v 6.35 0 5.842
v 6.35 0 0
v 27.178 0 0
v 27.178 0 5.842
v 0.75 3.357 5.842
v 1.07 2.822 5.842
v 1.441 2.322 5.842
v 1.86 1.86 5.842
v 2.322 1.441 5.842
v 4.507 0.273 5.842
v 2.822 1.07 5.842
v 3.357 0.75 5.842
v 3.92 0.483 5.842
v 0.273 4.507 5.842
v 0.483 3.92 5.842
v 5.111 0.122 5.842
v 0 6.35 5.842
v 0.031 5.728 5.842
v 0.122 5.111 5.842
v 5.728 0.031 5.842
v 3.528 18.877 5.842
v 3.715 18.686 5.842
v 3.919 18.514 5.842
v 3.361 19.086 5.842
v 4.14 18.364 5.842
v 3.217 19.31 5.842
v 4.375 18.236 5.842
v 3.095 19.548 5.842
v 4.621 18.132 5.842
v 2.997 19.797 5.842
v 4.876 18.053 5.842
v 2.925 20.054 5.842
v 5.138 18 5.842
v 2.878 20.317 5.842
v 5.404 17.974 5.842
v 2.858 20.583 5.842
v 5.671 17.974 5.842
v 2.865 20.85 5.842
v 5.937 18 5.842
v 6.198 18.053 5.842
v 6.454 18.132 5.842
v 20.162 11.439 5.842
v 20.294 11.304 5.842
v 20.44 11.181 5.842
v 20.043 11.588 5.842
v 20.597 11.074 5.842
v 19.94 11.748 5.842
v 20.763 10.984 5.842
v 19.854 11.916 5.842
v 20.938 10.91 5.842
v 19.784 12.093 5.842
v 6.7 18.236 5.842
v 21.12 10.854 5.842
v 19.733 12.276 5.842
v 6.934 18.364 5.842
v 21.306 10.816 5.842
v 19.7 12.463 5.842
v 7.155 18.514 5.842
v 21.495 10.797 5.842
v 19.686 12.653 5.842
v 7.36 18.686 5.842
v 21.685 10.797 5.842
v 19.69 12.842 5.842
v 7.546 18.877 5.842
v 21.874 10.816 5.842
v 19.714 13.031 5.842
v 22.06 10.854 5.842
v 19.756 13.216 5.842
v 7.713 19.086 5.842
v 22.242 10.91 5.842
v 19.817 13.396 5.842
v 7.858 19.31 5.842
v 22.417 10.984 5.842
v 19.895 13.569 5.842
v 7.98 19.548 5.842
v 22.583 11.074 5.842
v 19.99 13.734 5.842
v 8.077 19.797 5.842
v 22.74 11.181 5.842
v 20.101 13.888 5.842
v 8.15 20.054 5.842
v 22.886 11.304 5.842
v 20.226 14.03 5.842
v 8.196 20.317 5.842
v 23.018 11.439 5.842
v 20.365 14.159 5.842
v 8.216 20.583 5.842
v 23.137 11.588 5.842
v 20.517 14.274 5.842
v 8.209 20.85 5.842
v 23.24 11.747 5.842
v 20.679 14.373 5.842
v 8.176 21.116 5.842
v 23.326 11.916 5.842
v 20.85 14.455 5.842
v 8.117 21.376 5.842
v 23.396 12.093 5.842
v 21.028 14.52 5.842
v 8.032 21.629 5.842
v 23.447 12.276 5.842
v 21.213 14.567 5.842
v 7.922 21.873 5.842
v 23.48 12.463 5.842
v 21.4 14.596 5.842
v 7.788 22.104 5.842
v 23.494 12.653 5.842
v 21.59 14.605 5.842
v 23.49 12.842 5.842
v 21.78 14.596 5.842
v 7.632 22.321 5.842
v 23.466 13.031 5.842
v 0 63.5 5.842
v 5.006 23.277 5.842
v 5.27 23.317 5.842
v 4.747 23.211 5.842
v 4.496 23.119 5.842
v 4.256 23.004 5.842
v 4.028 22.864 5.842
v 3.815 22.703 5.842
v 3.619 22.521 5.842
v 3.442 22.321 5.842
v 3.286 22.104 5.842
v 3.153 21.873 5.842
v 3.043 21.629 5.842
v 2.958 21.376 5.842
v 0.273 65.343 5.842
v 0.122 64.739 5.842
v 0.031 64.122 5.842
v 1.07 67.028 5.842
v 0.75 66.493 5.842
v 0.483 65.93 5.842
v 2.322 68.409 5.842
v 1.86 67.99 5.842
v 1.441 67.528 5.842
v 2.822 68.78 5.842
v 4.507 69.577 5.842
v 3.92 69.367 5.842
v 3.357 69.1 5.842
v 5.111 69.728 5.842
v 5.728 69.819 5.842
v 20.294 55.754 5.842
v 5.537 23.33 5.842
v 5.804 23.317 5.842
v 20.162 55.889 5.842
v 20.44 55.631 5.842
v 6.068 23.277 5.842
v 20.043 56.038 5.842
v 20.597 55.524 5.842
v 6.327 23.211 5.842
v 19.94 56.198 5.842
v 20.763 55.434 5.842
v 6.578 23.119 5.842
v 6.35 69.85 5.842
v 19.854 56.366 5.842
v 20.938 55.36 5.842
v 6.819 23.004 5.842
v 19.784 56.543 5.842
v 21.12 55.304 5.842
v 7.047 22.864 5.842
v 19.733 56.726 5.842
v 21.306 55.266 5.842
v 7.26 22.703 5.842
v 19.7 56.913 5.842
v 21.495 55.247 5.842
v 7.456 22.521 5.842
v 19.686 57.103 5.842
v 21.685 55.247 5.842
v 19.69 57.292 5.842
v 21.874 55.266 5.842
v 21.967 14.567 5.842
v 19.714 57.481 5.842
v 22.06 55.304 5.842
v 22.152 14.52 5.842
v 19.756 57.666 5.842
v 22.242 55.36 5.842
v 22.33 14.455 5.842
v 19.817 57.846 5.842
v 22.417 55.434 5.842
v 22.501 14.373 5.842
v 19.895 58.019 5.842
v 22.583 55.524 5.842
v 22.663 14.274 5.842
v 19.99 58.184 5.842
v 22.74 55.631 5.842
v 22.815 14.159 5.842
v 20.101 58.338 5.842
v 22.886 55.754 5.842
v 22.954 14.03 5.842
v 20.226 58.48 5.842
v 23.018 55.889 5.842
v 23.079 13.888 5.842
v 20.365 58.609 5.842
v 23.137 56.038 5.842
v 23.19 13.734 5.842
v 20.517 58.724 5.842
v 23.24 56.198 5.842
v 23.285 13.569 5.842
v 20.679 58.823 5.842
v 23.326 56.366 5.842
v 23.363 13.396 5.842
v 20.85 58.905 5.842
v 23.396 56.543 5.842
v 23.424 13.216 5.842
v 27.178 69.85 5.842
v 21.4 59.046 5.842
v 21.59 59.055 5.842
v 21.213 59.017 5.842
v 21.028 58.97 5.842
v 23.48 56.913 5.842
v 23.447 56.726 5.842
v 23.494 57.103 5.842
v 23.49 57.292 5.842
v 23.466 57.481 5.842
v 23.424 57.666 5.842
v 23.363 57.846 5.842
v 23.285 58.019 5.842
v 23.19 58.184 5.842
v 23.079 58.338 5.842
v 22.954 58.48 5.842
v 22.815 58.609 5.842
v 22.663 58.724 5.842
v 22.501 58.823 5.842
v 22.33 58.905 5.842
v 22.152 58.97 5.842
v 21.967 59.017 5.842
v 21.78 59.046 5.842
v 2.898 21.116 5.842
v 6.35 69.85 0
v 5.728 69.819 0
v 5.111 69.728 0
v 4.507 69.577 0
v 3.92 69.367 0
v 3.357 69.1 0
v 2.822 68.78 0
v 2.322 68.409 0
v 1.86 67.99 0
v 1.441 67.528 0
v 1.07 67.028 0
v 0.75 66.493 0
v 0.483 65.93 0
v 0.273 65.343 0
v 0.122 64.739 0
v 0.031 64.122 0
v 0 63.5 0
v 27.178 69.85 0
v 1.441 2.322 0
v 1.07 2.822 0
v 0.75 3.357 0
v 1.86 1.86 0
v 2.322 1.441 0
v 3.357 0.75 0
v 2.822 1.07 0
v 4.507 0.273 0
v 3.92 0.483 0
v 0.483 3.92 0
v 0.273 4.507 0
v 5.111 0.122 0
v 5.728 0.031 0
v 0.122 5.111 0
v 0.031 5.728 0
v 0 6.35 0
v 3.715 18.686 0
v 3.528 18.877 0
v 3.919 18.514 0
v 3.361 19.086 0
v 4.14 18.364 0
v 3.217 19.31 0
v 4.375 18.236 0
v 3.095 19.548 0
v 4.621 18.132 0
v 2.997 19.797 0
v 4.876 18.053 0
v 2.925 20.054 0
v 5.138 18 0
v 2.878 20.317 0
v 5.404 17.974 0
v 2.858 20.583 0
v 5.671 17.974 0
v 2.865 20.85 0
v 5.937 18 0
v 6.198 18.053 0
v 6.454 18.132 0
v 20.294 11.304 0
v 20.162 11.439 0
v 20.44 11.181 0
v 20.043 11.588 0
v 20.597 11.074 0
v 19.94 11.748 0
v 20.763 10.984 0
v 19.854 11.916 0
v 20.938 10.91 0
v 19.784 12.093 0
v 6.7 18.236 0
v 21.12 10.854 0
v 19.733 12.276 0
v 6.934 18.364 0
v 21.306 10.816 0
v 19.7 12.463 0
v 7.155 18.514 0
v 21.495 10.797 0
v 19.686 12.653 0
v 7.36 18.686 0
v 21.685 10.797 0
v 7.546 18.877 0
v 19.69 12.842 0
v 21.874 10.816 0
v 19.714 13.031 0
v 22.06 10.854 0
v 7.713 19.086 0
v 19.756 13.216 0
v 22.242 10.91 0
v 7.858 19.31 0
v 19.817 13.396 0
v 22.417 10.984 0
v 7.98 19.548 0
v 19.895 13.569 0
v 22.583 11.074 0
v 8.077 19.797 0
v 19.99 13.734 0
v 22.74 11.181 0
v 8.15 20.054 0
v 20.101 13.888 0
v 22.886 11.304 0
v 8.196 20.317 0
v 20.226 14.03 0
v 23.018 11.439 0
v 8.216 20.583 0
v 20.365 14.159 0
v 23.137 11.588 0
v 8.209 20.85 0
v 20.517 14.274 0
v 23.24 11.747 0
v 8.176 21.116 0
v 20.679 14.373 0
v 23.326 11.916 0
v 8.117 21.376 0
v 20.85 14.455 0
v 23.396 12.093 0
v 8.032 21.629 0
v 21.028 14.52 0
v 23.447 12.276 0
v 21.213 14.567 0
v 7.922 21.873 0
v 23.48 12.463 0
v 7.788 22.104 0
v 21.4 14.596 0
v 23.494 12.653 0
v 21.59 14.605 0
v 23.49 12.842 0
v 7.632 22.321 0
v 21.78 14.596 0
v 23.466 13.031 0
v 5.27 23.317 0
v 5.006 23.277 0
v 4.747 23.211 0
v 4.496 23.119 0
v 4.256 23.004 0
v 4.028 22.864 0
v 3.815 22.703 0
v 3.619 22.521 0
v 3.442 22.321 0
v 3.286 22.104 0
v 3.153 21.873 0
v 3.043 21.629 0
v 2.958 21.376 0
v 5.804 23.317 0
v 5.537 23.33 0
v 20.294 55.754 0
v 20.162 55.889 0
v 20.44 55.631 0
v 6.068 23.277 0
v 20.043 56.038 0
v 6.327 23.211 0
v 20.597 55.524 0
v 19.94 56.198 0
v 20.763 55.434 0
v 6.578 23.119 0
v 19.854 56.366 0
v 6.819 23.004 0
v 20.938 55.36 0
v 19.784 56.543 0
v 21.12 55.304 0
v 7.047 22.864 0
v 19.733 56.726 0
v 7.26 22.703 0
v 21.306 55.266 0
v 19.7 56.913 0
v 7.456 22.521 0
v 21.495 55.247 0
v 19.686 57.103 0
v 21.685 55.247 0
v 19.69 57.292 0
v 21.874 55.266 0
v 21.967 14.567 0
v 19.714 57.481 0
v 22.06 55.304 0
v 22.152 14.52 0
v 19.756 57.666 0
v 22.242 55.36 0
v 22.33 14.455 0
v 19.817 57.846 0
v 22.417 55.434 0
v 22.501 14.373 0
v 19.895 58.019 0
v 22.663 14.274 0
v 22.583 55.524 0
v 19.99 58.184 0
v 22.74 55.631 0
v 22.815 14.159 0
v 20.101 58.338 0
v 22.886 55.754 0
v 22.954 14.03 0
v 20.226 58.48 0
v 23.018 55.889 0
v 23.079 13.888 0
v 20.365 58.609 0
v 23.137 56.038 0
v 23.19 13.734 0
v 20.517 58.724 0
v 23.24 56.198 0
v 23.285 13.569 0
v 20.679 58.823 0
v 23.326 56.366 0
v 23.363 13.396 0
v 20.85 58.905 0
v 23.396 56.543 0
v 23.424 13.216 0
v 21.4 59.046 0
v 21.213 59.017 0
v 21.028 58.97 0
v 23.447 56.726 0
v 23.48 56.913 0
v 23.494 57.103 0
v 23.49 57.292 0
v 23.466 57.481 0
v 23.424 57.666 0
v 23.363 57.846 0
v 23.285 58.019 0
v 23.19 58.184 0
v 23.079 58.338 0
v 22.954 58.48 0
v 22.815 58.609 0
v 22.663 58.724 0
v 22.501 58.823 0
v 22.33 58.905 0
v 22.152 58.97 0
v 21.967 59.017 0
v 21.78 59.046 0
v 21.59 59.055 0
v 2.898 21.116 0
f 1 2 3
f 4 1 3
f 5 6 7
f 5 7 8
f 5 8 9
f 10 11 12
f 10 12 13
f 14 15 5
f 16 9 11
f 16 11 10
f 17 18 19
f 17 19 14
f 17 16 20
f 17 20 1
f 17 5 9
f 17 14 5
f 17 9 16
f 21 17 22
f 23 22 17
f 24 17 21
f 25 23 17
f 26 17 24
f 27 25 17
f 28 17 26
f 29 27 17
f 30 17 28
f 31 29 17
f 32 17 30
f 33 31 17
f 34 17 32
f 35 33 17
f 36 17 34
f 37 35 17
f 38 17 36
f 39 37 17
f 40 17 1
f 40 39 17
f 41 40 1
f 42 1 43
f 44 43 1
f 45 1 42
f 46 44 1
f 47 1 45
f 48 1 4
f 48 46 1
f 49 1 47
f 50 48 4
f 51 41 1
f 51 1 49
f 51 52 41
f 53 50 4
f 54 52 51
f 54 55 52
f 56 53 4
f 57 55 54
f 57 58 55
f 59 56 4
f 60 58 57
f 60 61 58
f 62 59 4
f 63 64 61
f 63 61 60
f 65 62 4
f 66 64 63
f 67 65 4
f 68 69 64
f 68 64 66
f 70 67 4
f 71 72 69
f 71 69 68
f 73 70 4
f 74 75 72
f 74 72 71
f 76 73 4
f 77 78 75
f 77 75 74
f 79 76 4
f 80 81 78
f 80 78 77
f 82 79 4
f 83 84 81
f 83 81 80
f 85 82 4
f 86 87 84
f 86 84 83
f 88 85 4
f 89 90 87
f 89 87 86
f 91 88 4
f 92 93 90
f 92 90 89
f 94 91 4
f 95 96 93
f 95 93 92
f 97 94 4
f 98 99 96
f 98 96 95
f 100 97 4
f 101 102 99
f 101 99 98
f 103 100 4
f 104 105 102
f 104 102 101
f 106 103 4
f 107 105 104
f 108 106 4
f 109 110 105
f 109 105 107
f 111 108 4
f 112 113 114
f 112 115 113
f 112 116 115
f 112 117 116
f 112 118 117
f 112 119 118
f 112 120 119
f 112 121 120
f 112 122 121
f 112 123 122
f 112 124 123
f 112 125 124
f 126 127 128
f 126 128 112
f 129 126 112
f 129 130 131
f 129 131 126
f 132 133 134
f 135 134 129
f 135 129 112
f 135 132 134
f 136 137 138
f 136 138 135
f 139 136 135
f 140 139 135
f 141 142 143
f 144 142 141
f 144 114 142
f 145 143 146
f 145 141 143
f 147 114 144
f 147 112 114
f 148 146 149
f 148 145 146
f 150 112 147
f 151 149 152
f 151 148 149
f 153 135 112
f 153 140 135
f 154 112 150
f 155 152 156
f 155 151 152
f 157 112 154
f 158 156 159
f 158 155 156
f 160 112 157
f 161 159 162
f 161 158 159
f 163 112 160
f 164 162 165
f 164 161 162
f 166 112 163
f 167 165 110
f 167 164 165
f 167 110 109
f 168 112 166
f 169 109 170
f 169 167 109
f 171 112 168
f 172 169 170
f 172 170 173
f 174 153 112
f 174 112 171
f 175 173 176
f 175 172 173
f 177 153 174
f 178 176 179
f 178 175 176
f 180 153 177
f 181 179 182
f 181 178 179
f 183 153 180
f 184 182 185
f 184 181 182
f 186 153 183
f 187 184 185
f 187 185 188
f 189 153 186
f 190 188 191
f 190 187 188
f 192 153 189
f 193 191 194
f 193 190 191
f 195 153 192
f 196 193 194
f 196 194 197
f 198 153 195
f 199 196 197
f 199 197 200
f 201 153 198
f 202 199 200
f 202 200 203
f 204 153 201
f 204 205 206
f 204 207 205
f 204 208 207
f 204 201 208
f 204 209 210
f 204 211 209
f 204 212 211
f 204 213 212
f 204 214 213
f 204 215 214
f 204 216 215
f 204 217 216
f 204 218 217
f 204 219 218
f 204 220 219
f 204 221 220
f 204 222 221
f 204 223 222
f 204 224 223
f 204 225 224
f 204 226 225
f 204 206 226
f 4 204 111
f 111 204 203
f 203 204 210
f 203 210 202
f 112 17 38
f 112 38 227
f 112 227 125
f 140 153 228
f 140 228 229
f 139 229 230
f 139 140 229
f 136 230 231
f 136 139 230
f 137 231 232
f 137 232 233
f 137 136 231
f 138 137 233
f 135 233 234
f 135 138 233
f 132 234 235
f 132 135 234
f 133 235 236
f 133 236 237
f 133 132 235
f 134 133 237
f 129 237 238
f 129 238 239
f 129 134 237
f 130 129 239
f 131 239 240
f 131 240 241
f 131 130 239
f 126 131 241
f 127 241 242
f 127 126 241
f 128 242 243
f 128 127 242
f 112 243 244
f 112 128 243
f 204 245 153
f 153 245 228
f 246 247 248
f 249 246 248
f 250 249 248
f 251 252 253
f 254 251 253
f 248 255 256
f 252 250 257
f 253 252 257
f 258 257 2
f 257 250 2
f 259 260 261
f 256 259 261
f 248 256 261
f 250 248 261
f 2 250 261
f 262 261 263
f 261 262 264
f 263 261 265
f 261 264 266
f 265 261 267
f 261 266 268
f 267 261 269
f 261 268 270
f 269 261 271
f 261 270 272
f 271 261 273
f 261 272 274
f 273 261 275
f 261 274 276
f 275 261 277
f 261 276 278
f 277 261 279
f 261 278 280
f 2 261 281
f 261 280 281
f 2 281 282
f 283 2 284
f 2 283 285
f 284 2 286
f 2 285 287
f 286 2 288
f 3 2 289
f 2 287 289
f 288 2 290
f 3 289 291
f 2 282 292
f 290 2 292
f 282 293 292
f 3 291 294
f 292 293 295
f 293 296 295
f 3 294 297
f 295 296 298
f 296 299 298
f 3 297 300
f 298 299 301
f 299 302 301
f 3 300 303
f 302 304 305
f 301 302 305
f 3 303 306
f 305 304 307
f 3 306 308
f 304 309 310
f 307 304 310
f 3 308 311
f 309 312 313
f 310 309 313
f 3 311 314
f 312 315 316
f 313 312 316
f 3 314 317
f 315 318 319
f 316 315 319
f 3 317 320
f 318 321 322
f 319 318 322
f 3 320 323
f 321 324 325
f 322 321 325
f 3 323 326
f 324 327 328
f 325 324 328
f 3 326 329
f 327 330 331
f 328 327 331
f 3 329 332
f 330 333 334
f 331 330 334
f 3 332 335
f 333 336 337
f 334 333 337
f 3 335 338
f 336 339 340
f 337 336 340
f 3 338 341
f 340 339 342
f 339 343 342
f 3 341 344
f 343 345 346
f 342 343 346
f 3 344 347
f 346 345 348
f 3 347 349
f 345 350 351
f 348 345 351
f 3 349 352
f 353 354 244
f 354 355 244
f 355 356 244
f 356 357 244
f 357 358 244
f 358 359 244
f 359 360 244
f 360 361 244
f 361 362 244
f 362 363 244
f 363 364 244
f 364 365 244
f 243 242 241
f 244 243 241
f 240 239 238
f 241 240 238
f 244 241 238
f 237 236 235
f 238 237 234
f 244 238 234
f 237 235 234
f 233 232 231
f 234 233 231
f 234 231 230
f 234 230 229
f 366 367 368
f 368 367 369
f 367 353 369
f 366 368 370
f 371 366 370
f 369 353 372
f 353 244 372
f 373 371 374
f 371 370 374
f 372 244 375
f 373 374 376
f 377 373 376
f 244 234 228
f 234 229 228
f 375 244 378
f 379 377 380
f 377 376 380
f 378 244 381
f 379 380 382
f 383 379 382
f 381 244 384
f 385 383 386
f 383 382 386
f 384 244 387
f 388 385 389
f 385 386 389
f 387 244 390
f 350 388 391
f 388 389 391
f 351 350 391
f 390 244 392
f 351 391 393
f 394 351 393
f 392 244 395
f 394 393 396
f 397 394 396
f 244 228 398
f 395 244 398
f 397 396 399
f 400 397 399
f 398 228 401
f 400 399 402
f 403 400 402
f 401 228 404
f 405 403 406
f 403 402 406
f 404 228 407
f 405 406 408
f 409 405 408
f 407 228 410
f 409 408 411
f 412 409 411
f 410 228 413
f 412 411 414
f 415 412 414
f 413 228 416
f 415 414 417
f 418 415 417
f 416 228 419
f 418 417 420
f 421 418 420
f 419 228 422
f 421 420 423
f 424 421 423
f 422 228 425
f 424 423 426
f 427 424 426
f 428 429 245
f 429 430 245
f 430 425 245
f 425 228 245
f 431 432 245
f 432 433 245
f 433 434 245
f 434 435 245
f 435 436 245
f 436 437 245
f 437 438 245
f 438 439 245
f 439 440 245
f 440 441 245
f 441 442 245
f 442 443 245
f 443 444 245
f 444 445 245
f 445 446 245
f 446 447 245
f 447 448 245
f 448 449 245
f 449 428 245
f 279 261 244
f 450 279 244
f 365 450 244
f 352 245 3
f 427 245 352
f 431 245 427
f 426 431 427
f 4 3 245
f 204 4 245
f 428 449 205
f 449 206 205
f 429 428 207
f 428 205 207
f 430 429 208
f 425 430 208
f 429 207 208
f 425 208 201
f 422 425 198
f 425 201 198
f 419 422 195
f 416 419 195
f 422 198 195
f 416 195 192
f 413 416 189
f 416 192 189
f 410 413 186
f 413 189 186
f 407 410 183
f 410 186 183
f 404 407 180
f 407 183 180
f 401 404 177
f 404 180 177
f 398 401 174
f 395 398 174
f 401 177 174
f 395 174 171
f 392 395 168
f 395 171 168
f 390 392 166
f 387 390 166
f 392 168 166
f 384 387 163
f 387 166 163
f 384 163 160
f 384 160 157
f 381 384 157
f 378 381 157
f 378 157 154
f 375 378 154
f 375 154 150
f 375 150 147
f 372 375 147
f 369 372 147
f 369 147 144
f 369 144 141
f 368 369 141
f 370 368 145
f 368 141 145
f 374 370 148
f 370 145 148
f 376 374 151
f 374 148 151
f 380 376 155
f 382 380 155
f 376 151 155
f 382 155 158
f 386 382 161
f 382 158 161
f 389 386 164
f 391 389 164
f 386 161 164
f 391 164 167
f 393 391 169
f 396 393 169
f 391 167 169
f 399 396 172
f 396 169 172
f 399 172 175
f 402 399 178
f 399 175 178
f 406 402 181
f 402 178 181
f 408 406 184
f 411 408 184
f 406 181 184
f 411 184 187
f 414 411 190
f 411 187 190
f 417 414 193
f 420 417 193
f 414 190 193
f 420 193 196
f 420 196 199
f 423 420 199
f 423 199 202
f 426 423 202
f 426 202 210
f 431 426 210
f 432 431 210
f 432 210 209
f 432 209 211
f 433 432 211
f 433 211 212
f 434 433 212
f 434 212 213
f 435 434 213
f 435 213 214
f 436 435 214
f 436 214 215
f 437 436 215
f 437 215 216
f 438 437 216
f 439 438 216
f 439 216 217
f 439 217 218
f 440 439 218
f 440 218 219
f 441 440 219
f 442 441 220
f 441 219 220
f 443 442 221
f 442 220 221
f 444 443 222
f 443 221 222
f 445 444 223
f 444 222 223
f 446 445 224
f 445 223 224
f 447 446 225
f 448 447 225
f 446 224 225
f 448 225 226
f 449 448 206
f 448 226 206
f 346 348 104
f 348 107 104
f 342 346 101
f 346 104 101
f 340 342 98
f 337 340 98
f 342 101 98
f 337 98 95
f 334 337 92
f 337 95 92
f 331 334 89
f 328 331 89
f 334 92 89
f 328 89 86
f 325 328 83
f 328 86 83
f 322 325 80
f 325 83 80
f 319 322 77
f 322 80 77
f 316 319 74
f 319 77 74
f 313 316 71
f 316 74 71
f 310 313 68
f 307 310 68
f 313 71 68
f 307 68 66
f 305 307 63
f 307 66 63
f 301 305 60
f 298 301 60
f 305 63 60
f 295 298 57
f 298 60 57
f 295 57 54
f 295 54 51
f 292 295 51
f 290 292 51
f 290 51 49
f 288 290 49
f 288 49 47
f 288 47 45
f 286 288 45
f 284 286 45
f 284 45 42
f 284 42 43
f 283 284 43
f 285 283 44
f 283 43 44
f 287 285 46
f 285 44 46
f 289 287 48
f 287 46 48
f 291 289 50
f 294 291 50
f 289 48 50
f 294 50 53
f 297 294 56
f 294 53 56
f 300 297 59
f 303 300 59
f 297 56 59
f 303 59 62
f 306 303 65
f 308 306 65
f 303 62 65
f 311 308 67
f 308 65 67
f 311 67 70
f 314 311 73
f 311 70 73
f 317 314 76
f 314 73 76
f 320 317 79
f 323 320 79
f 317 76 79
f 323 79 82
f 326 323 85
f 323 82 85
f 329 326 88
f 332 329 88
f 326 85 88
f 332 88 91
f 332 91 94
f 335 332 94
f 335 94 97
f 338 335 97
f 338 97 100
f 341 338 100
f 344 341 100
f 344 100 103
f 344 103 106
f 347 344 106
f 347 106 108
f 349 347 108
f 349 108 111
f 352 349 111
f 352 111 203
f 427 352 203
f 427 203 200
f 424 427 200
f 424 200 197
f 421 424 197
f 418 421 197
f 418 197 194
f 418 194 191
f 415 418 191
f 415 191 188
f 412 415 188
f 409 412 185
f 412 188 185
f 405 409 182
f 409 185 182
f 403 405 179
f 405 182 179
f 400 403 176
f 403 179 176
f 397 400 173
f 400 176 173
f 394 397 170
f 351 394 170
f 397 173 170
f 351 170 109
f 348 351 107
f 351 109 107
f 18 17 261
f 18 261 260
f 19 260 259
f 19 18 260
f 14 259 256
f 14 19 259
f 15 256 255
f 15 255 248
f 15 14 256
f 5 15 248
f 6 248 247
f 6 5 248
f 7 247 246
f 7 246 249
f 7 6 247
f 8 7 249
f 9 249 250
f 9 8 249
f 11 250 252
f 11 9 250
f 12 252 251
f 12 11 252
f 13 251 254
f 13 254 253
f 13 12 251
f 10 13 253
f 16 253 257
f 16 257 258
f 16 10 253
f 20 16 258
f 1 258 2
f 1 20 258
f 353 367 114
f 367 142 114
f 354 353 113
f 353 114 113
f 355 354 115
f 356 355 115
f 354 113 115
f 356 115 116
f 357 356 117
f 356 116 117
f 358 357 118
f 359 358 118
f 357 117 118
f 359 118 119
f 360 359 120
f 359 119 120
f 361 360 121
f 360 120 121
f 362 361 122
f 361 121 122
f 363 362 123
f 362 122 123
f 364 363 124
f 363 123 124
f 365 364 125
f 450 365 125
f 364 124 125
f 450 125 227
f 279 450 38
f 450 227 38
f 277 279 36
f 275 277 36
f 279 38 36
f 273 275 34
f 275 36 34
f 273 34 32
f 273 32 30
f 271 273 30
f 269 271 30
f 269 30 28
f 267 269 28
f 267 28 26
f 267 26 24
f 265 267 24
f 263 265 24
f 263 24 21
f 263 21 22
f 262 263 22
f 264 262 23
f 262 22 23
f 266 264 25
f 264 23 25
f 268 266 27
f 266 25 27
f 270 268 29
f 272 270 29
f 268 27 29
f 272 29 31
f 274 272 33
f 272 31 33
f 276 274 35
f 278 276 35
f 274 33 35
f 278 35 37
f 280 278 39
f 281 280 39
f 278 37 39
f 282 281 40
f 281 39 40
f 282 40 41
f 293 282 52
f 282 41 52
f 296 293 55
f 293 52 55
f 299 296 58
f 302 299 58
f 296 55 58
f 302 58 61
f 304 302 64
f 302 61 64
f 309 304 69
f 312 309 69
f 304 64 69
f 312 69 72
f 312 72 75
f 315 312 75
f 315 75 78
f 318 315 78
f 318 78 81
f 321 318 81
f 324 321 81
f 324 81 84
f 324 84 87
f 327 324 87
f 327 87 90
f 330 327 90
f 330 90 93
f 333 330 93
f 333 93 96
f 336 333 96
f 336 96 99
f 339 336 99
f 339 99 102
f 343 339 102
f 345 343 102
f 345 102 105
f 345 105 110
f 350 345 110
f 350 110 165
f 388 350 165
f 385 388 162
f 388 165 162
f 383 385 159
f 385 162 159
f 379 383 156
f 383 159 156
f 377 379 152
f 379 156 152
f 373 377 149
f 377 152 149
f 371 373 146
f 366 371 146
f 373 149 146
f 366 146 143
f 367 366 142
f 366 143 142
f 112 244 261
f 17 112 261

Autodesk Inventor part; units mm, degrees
ref_plane "YZ Plane" through (0, 0, 0) normal (1, 0, 0) x (0, 1, 0)
ref_plane "XZ Plane" through (0, 0, 0) normal (0, 1, 0) x (-1, 0, 0)
ref_plane "XY Plane" through (0, 0, 0) normal (0, 0, 1) x (1, 0, 0)
sketch "Sketch1" plane through (0, 0, 0) normal (0, 0, 1) x (1, 0, 0)
  line L0 (0, 83.82) -> (0, -13.97) projected
  line L1 (-5.4356, 0) -> (32.6136, 0) projected
  line L2 (0, 0) -> (27.178, 0)
  line L3 (27.178, 0) -> (27.178, 69.85)
  line L4 (27.178, 69.85) -> (0, 69.85)
  line L5 (0, 69.85) -> (0, 0)
  line L6 (0, 34.925) -> (27.178, 34.925) construction
  point P0 (5.5372, 20.6502)
  point P1 (21.59, 57.15)
  point P2 (21.59, 12.7)
  dimension "d0" = 27.178
  dimension "d1" = 69.85
  dimension "d9" = 5.588
  dimension "d10" = 22.225
  dimension "d11" = 22.225
  dimension "d29" = 21.6408
  dimension "d30" = 20.6502
extrude "Extrusion1" add sketch "Sketch1" along normal blind 5.842
hole "Hole1" at (21.59, 57.15, 0) at (21.59, 12.7, 0) direction (0, 0, 1) diameter 3.81 end through all
hole "Hole2" at (5.5372, 20.6502, 0) direction (0, 0, 1) diameter 5.3594 end through all clearance for "Flat Head Machine Screw (82)" size "#10" standard "Ansi Unified Screw Threads"
fillet "Fillet1" radius 6.35 2 edges at (0, 69.85, 2.921) (0, 0, 2.921)
